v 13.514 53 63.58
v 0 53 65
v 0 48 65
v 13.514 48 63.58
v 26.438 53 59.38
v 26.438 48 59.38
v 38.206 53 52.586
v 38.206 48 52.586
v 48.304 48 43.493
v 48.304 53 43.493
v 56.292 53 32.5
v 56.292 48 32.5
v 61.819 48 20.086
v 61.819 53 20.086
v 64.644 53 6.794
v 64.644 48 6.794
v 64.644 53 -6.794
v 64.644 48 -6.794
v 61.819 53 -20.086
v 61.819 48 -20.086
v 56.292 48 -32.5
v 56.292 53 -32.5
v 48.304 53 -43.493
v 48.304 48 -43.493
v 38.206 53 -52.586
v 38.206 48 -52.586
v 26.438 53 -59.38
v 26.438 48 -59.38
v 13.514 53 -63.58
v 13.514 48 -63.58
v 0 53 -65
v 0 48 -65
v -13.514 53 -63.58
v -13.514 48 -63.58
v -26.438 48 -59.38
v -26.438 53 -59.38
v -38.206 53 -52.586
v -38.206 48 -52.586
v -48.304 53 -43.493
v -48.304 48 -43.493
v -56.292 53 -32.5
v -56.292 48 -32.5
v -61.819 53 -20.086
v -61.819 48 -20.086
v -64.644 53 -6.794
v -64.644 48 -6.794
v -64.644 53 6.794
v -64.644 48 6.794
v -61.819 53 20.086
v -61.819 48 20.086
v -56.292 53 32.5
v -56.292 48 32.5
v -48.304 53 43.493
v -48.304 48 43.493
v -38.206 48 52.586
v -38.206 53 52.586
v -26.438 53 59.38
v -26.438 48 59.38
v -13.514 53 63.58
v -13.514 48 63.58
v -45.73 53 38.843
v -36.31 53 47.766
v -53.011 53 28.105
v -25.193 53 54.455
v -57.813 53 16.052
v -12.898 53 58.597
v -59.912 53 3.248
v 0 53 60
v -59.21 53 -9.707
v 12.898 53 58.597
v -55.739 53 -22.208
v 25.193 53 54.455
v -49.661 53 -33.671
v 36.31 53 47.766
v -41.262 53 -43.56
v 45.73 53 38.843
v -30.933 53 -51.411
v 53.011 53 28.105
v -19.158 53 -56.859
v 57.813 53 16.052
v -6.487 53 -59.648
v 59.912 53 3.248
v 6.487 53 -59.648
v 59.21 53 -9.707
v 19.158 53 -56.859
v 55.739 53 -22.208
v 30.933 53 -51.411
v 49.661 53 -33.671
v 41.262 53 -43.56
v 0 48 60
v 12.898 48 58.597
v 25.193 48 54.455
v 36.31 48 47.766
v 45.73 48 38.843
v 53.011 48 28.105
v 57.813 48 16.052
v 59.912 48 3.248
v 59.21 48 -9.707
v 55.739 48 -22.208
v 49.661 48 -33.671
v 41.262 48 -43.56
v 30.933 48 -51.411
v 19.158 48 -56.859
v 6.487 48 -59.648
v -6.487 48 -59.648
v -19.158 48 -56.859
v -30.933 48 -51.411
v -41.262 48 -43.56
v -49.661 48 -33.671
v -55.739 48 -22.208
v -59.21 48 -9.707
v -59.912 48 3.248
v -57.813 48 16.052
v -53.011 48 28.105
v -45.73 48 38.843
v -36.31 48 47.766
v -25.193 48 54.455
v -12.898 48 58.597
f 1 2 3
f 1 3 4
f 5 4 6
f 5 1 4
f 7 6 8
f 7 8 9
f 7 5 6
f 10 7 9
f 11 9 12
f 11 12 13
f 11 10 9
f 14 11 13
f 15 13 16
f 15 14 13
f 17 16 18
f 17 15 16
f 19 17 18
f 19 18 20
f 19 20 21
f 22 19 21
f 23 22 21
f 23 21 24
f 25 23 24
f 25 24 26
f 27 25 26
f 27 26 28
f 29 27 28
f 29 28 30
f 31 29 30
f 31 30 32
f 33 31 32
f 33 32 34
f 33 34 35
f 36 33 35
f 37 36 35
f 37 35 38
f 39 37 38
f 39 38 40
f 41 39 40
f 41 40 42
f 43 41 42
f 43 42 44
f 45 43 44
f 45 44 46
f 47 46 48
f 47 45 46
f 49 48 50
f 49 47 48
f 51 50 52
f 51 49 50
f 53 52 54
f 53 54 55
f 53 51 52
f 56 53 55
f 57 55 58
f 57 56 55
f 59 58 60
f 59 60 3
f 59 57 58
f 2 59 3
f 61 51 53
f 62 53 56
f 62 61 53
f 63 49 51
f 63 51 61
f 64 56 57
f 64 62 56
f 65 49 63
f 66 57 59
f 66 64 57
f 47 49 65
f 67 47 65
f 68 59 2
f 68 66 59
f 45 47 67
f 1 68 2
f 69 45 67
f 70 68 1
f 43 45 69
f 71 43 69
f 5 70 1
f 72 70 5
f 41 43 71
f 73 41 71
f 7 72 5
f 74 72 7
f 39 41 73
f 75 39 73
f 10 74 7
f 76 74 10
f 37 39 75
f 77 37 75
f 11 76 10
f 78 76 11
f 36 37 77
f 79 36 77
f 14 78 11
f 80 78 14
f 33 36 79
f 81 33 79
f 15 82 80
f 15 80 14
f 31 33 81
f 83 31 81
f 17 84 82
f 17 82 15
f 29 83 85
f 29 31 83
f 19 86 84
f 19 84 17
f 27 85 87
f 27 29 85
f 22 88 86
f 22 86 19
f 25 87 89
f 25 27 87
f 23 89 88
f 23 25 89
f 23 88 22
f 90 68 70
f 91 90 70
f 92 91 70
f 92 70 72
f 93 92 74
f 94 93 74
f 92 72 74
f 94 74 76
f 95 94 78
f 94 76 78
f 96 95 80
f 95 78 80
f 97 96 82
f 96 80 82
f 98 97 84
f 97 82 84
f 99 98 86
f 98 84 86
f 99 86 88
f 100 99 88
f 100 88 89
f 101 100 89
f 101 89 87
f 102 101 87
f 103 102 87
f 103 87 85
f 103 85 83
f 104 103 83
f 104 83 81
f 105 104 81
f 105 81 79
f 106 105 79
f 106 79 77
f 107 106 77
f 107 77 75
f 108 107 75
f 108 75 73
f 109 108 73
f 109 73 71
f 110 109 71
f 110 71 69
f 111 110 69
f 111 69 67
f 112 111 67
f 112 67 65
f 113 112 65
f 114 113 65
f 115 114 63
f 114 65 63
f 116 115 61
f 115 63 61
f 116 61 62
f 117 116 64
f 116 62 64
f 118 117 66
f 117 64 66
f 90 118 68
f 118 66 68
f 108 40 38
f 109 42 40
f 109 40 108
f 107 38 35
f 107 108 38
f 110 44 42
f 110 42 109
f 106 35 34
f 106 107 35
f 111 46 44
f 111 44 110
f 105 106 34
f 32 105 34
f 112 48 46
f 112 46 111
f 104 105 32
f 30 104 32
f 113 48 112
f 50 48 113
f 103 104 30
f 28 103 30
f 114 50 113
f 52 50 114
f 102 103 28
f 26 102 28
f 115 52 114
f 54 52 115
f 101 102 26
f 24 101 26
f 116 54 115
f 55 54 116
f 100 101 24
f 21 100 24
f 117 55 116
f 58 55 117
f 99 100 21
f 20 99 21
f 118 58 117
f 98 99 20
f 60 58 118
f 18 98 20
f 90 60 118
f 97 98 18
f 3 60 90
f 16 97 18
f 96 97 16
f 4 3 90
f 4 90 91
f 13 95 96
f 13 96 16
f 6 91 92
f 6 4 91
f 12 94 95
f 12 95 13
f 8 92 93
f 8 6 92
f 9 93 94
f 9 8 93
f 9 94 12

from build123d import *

# Parameters (mm, degrees)
SKETCH1_R           = 75
SKETCH1_R_2         = 62.3
BOSS_EXTRUDE1_DEPTH = 53
BOSS_EXTRUDE3_START = 3
SKETCH3_R           = 75
SKETCH3_R_2         = 47
BOSS_EXTRUDE3_DEPTH = 3
BOSS_EXTRUDE4_START = 14
SKETCH4_R           = 50.1
SKETCH4_R_2         = 47
BOSS_EXTRUDE4_DEPTH = 14
BOSS_EXTRUDE5_START = 1
SKETCH5_R           = 62.3
SKETCH5_R_2         = 50.1
BOSS_EXTRUDE5_DEPTH = 1
CUT_EXTRUDE2_START  = -64
SKETCH6_R           = 75
SKETCH6_R_2         = 67.5
CUT_EXTRUDE2_DEPTH  = 64
BOSS_EXTRUDE6_REACH = 111.186
SKETCH7_R           = 62.3
SKETCH7_R_2         = 60
SKETCH9_R           = 50.1
SKETCH9_R_2         = 47
CUT_EXTRUDE3_DEPTH  = 17
BOSS_EXTRUDE7_START = -4
SKETCH10_R          = 50.1
SKETCH10_R_2        = 48.5
BOSS_EXTRUDE7_DEPTH = 4
SKETCH12_R          = 48.5
SKETCH12_R_2        = 47.6
BOSS_EXTRUDE8_DEPTH = 4
BOSS_EXTRUDE9_START = -17
SKETCH13_R          = 47.6
SKETCH13_R_2        = 45.1
BOSS_EXTRUDE9_DEPTH = 17
SKETCH14_R          = 75.997463879
CUT_EXTRUDE4_DEPTH  = 48
SKETCH15_R          = 79.637366743
SKETCH15_R_2        = 65
CUT_EXTRUDE5_DEPTH  = 50


with BuildPart() as part:
    # Sketch1 → Boss-Extrude1 (new body)
    with BuildSketch(Plane(origin=(0, 0, 0), x_dir=(1, 0, 0), z_dir=(0, 1, 0))):
        with Locations(Location((0, 0, 0), (0, 0, 270))):
            Circle(SKETCH1_R)
        with Locations(Location((0, 0, 0), (0, 0, 270))):
            Circle(SKETCH1_R_2, mode=Mode.SUBTRACT)
    extrude(amount=BOSS_EXTRUDE1_DEPTH)

    # Sketch3 → Boss-Extrude3 (add)
    with BuildSketch(Plane(origin=(0, 20, 0), x_dir=(-1, 0, 0), z_dir=(0, -1, 0)).offset(BOSS_EXTRUDE3_START)):
        with Locations(Location((0, 0, 0), (0, 0, 270))):
            Circle(SKETCH3_R)
        with Locations(Location((0, 0, 0), (0, 0, 90))):
            Circle(SKETCH3_R_2, mode=Mode.SUBTRACT)
    extrude(amount=-BOSS_EXTRUDE3_DEPTH)

    # Sketch4 → Boss-Extrude4 (add)
    with BuildSketch(Plane.XZ.offset(-17).offset(BOSS_EXTRUDE4_START)):
        with Locations(Location((0, 0, 0), (0, 0, 270))):
            Circle(SKETCH4_R)
        with Locations(Location((0, 0, 0), (0, 0, 270))):
            Circle(SKETCH4_R_2, mode=Mode.SUBTRACT)
    extrude(amount=-BOSS_EXTRUDE4_DEPTH)

    # Sketch5 → Boss-Extrude5 (add)
    with BuildSketch(Plane.XZ.offset(-17).offset(BOSS_EXTRUDE5_START)):
        with Locations(Location((0, 0, 0), (0, 0, 270))):
            Circle(SKETCH5_R)
        with Locations(Location((0, 0, 0), (0, 0, 270))):
            Circle(SKETCH5_R_2, mode=Mode.SUBTRACT)
    extrude(amount=-BOSS_EXTRUDE5_DEPTH)

    # Sketch6 → Cut-Extrude2 (cut)
    with BuildSketch(Plane(origin=(0, 53, 0), x_dir=(1, 0, 0), z_dir=(0, 1, 0)).offset(CUT_EXTRUDE2_START)):
        Circle(SKETCH6_R)
        with Locations(Location((0, 0, 0), (0, 0, 270))):
            Circle(SKETCH6_R_2, mode=Mode.SUBTRACT)
    extrude(amount=CUT_EXTRUDE2_DEPTH, mode=Mode.SUBTRACT)

    # Boss-Extrude6: up to this face of the body (flat: up to its plane)
    boss_extrude6_end = Plane(part.part.faces().sort_by_distance((0, 0, -65.590811691))[0])
    # Sketch7 → Boss-Extrude6 (add, up to the picked face)
    with BuildSketch(Plane(origin=(0, 53, 0), x_dir=(1, 0, 0), z_dir=(0, 1, 0)), mode=Mode.PRIVATE) as boss_extrude6_sk1:
        Circle(SKETCH7_R)
        with Locations(Location((0, 0, 0), (0, 0, 270))):
            Circle(SKETCH7_R_2, mode=Mode.SUBTRACT)
    boss_extrude6_tool1 = split(extrude(boss_extrude6_sk1.sketch, amount=-BOSS_EXTRUDE6_REACH, mode=Mode.PRIVATE), bisect_by=boss_extrude6_end, keep=Keep.BOTH, mode=Mode.PRIVATE)
    add(boss_extrude6_tool1.solids().sort_by(Axis((-60.53789, 53, 0), (0, -1, 0)))[0])

    # Sketch9 → Cut-Extrude3 (cut)
    with BuildSketch(Plane.XZ.offset(-3)):
        with Locations(Location((0, 0, 0), (0, 0, 270))):
            Circle(SKETCH9_R)
        Circle(SKETCH9_R_2, mode=Mode.SUBTRACT)
    extrude(amount=-CUT_EXTRUDE3_DEPTH, mode=Mode.SUBTRACT)

    # Sketch10 → Boss-Extrude7 (add)
    with BuildSketch(Plane(origin=(0, 20, 0), x_dir=(1, 0, 0), z_dir=(0, 1, 0)).offset(BOSS_EXTRUDE7_START)):
        Circle(SKETCH10_R)
        with Locations(Location((0, 0, 0), (0, 0, 270))):
            Circle(SKETCH10_R_2, mode=Mode.SUBTRACT)
    extrude(amount=BOSS_EXTRUDE7_DEPTH)

    # Sketch12 → Boss-Extrude8 (add)
    with BuildSketch(Plane.XZ.offset(-16)):
        Circle(SKETCH12_R)
        with Locations(Location((0, 0, 0), (0, 0, 270))):
            Circle(SKETCH12_R_2, mode=Mode.SUBTRACT)
    extrude(amount=-BOSS_EXTRUDE8_DEPTH)

    # Sketch13 → Boss-Extrude9 (add)
    with BuildSketch(Plane(origin=(0, 20, 0), x_dir=(1, 0, 0), z_dir=(0, 1, 0)).offset(BOSS_EXTRUDE9_START)):
        with Locations(Location((0, 0, 0), (0, 0, 270))):
            Circle(SKETCH13_R)
        with Locations(Location((0, 0, 0), (0, 0, 270))):
            Circle(SKETCH13_R_2, mode=Mode.SUBTRACT)
    extrude(amount=BOSS_EXTRUDE9_DEPTH)

    # Sketch14 → Cut-Extrude4 (cut)
    with BuildSketch(Plane.XZ):
        Circle(SKETCH14_R)
    extrude(amount=-CUT_EXTRUDE4_DEPTH, mode=Mode.SUBTRACT)

    # Sketch15 → Cut-Extrude5 (cut)
    with BuildSketch(Plane(origin=(0, 53, 0), x_dir=(1, 0, 0), z_dir=(0, 1, 0))):
        Circle(SKETCH15_R)
        with Locations(Location((0, 0, 0), (0, 0, 270))):
            Circle(SKETCH15_R_2, mode=Mode.SUBTRACT)
    extrude(amount=-CUT_EXTRUDE5_DEPTH, mode=Mode.SUBTRACT)


solid = part.part
